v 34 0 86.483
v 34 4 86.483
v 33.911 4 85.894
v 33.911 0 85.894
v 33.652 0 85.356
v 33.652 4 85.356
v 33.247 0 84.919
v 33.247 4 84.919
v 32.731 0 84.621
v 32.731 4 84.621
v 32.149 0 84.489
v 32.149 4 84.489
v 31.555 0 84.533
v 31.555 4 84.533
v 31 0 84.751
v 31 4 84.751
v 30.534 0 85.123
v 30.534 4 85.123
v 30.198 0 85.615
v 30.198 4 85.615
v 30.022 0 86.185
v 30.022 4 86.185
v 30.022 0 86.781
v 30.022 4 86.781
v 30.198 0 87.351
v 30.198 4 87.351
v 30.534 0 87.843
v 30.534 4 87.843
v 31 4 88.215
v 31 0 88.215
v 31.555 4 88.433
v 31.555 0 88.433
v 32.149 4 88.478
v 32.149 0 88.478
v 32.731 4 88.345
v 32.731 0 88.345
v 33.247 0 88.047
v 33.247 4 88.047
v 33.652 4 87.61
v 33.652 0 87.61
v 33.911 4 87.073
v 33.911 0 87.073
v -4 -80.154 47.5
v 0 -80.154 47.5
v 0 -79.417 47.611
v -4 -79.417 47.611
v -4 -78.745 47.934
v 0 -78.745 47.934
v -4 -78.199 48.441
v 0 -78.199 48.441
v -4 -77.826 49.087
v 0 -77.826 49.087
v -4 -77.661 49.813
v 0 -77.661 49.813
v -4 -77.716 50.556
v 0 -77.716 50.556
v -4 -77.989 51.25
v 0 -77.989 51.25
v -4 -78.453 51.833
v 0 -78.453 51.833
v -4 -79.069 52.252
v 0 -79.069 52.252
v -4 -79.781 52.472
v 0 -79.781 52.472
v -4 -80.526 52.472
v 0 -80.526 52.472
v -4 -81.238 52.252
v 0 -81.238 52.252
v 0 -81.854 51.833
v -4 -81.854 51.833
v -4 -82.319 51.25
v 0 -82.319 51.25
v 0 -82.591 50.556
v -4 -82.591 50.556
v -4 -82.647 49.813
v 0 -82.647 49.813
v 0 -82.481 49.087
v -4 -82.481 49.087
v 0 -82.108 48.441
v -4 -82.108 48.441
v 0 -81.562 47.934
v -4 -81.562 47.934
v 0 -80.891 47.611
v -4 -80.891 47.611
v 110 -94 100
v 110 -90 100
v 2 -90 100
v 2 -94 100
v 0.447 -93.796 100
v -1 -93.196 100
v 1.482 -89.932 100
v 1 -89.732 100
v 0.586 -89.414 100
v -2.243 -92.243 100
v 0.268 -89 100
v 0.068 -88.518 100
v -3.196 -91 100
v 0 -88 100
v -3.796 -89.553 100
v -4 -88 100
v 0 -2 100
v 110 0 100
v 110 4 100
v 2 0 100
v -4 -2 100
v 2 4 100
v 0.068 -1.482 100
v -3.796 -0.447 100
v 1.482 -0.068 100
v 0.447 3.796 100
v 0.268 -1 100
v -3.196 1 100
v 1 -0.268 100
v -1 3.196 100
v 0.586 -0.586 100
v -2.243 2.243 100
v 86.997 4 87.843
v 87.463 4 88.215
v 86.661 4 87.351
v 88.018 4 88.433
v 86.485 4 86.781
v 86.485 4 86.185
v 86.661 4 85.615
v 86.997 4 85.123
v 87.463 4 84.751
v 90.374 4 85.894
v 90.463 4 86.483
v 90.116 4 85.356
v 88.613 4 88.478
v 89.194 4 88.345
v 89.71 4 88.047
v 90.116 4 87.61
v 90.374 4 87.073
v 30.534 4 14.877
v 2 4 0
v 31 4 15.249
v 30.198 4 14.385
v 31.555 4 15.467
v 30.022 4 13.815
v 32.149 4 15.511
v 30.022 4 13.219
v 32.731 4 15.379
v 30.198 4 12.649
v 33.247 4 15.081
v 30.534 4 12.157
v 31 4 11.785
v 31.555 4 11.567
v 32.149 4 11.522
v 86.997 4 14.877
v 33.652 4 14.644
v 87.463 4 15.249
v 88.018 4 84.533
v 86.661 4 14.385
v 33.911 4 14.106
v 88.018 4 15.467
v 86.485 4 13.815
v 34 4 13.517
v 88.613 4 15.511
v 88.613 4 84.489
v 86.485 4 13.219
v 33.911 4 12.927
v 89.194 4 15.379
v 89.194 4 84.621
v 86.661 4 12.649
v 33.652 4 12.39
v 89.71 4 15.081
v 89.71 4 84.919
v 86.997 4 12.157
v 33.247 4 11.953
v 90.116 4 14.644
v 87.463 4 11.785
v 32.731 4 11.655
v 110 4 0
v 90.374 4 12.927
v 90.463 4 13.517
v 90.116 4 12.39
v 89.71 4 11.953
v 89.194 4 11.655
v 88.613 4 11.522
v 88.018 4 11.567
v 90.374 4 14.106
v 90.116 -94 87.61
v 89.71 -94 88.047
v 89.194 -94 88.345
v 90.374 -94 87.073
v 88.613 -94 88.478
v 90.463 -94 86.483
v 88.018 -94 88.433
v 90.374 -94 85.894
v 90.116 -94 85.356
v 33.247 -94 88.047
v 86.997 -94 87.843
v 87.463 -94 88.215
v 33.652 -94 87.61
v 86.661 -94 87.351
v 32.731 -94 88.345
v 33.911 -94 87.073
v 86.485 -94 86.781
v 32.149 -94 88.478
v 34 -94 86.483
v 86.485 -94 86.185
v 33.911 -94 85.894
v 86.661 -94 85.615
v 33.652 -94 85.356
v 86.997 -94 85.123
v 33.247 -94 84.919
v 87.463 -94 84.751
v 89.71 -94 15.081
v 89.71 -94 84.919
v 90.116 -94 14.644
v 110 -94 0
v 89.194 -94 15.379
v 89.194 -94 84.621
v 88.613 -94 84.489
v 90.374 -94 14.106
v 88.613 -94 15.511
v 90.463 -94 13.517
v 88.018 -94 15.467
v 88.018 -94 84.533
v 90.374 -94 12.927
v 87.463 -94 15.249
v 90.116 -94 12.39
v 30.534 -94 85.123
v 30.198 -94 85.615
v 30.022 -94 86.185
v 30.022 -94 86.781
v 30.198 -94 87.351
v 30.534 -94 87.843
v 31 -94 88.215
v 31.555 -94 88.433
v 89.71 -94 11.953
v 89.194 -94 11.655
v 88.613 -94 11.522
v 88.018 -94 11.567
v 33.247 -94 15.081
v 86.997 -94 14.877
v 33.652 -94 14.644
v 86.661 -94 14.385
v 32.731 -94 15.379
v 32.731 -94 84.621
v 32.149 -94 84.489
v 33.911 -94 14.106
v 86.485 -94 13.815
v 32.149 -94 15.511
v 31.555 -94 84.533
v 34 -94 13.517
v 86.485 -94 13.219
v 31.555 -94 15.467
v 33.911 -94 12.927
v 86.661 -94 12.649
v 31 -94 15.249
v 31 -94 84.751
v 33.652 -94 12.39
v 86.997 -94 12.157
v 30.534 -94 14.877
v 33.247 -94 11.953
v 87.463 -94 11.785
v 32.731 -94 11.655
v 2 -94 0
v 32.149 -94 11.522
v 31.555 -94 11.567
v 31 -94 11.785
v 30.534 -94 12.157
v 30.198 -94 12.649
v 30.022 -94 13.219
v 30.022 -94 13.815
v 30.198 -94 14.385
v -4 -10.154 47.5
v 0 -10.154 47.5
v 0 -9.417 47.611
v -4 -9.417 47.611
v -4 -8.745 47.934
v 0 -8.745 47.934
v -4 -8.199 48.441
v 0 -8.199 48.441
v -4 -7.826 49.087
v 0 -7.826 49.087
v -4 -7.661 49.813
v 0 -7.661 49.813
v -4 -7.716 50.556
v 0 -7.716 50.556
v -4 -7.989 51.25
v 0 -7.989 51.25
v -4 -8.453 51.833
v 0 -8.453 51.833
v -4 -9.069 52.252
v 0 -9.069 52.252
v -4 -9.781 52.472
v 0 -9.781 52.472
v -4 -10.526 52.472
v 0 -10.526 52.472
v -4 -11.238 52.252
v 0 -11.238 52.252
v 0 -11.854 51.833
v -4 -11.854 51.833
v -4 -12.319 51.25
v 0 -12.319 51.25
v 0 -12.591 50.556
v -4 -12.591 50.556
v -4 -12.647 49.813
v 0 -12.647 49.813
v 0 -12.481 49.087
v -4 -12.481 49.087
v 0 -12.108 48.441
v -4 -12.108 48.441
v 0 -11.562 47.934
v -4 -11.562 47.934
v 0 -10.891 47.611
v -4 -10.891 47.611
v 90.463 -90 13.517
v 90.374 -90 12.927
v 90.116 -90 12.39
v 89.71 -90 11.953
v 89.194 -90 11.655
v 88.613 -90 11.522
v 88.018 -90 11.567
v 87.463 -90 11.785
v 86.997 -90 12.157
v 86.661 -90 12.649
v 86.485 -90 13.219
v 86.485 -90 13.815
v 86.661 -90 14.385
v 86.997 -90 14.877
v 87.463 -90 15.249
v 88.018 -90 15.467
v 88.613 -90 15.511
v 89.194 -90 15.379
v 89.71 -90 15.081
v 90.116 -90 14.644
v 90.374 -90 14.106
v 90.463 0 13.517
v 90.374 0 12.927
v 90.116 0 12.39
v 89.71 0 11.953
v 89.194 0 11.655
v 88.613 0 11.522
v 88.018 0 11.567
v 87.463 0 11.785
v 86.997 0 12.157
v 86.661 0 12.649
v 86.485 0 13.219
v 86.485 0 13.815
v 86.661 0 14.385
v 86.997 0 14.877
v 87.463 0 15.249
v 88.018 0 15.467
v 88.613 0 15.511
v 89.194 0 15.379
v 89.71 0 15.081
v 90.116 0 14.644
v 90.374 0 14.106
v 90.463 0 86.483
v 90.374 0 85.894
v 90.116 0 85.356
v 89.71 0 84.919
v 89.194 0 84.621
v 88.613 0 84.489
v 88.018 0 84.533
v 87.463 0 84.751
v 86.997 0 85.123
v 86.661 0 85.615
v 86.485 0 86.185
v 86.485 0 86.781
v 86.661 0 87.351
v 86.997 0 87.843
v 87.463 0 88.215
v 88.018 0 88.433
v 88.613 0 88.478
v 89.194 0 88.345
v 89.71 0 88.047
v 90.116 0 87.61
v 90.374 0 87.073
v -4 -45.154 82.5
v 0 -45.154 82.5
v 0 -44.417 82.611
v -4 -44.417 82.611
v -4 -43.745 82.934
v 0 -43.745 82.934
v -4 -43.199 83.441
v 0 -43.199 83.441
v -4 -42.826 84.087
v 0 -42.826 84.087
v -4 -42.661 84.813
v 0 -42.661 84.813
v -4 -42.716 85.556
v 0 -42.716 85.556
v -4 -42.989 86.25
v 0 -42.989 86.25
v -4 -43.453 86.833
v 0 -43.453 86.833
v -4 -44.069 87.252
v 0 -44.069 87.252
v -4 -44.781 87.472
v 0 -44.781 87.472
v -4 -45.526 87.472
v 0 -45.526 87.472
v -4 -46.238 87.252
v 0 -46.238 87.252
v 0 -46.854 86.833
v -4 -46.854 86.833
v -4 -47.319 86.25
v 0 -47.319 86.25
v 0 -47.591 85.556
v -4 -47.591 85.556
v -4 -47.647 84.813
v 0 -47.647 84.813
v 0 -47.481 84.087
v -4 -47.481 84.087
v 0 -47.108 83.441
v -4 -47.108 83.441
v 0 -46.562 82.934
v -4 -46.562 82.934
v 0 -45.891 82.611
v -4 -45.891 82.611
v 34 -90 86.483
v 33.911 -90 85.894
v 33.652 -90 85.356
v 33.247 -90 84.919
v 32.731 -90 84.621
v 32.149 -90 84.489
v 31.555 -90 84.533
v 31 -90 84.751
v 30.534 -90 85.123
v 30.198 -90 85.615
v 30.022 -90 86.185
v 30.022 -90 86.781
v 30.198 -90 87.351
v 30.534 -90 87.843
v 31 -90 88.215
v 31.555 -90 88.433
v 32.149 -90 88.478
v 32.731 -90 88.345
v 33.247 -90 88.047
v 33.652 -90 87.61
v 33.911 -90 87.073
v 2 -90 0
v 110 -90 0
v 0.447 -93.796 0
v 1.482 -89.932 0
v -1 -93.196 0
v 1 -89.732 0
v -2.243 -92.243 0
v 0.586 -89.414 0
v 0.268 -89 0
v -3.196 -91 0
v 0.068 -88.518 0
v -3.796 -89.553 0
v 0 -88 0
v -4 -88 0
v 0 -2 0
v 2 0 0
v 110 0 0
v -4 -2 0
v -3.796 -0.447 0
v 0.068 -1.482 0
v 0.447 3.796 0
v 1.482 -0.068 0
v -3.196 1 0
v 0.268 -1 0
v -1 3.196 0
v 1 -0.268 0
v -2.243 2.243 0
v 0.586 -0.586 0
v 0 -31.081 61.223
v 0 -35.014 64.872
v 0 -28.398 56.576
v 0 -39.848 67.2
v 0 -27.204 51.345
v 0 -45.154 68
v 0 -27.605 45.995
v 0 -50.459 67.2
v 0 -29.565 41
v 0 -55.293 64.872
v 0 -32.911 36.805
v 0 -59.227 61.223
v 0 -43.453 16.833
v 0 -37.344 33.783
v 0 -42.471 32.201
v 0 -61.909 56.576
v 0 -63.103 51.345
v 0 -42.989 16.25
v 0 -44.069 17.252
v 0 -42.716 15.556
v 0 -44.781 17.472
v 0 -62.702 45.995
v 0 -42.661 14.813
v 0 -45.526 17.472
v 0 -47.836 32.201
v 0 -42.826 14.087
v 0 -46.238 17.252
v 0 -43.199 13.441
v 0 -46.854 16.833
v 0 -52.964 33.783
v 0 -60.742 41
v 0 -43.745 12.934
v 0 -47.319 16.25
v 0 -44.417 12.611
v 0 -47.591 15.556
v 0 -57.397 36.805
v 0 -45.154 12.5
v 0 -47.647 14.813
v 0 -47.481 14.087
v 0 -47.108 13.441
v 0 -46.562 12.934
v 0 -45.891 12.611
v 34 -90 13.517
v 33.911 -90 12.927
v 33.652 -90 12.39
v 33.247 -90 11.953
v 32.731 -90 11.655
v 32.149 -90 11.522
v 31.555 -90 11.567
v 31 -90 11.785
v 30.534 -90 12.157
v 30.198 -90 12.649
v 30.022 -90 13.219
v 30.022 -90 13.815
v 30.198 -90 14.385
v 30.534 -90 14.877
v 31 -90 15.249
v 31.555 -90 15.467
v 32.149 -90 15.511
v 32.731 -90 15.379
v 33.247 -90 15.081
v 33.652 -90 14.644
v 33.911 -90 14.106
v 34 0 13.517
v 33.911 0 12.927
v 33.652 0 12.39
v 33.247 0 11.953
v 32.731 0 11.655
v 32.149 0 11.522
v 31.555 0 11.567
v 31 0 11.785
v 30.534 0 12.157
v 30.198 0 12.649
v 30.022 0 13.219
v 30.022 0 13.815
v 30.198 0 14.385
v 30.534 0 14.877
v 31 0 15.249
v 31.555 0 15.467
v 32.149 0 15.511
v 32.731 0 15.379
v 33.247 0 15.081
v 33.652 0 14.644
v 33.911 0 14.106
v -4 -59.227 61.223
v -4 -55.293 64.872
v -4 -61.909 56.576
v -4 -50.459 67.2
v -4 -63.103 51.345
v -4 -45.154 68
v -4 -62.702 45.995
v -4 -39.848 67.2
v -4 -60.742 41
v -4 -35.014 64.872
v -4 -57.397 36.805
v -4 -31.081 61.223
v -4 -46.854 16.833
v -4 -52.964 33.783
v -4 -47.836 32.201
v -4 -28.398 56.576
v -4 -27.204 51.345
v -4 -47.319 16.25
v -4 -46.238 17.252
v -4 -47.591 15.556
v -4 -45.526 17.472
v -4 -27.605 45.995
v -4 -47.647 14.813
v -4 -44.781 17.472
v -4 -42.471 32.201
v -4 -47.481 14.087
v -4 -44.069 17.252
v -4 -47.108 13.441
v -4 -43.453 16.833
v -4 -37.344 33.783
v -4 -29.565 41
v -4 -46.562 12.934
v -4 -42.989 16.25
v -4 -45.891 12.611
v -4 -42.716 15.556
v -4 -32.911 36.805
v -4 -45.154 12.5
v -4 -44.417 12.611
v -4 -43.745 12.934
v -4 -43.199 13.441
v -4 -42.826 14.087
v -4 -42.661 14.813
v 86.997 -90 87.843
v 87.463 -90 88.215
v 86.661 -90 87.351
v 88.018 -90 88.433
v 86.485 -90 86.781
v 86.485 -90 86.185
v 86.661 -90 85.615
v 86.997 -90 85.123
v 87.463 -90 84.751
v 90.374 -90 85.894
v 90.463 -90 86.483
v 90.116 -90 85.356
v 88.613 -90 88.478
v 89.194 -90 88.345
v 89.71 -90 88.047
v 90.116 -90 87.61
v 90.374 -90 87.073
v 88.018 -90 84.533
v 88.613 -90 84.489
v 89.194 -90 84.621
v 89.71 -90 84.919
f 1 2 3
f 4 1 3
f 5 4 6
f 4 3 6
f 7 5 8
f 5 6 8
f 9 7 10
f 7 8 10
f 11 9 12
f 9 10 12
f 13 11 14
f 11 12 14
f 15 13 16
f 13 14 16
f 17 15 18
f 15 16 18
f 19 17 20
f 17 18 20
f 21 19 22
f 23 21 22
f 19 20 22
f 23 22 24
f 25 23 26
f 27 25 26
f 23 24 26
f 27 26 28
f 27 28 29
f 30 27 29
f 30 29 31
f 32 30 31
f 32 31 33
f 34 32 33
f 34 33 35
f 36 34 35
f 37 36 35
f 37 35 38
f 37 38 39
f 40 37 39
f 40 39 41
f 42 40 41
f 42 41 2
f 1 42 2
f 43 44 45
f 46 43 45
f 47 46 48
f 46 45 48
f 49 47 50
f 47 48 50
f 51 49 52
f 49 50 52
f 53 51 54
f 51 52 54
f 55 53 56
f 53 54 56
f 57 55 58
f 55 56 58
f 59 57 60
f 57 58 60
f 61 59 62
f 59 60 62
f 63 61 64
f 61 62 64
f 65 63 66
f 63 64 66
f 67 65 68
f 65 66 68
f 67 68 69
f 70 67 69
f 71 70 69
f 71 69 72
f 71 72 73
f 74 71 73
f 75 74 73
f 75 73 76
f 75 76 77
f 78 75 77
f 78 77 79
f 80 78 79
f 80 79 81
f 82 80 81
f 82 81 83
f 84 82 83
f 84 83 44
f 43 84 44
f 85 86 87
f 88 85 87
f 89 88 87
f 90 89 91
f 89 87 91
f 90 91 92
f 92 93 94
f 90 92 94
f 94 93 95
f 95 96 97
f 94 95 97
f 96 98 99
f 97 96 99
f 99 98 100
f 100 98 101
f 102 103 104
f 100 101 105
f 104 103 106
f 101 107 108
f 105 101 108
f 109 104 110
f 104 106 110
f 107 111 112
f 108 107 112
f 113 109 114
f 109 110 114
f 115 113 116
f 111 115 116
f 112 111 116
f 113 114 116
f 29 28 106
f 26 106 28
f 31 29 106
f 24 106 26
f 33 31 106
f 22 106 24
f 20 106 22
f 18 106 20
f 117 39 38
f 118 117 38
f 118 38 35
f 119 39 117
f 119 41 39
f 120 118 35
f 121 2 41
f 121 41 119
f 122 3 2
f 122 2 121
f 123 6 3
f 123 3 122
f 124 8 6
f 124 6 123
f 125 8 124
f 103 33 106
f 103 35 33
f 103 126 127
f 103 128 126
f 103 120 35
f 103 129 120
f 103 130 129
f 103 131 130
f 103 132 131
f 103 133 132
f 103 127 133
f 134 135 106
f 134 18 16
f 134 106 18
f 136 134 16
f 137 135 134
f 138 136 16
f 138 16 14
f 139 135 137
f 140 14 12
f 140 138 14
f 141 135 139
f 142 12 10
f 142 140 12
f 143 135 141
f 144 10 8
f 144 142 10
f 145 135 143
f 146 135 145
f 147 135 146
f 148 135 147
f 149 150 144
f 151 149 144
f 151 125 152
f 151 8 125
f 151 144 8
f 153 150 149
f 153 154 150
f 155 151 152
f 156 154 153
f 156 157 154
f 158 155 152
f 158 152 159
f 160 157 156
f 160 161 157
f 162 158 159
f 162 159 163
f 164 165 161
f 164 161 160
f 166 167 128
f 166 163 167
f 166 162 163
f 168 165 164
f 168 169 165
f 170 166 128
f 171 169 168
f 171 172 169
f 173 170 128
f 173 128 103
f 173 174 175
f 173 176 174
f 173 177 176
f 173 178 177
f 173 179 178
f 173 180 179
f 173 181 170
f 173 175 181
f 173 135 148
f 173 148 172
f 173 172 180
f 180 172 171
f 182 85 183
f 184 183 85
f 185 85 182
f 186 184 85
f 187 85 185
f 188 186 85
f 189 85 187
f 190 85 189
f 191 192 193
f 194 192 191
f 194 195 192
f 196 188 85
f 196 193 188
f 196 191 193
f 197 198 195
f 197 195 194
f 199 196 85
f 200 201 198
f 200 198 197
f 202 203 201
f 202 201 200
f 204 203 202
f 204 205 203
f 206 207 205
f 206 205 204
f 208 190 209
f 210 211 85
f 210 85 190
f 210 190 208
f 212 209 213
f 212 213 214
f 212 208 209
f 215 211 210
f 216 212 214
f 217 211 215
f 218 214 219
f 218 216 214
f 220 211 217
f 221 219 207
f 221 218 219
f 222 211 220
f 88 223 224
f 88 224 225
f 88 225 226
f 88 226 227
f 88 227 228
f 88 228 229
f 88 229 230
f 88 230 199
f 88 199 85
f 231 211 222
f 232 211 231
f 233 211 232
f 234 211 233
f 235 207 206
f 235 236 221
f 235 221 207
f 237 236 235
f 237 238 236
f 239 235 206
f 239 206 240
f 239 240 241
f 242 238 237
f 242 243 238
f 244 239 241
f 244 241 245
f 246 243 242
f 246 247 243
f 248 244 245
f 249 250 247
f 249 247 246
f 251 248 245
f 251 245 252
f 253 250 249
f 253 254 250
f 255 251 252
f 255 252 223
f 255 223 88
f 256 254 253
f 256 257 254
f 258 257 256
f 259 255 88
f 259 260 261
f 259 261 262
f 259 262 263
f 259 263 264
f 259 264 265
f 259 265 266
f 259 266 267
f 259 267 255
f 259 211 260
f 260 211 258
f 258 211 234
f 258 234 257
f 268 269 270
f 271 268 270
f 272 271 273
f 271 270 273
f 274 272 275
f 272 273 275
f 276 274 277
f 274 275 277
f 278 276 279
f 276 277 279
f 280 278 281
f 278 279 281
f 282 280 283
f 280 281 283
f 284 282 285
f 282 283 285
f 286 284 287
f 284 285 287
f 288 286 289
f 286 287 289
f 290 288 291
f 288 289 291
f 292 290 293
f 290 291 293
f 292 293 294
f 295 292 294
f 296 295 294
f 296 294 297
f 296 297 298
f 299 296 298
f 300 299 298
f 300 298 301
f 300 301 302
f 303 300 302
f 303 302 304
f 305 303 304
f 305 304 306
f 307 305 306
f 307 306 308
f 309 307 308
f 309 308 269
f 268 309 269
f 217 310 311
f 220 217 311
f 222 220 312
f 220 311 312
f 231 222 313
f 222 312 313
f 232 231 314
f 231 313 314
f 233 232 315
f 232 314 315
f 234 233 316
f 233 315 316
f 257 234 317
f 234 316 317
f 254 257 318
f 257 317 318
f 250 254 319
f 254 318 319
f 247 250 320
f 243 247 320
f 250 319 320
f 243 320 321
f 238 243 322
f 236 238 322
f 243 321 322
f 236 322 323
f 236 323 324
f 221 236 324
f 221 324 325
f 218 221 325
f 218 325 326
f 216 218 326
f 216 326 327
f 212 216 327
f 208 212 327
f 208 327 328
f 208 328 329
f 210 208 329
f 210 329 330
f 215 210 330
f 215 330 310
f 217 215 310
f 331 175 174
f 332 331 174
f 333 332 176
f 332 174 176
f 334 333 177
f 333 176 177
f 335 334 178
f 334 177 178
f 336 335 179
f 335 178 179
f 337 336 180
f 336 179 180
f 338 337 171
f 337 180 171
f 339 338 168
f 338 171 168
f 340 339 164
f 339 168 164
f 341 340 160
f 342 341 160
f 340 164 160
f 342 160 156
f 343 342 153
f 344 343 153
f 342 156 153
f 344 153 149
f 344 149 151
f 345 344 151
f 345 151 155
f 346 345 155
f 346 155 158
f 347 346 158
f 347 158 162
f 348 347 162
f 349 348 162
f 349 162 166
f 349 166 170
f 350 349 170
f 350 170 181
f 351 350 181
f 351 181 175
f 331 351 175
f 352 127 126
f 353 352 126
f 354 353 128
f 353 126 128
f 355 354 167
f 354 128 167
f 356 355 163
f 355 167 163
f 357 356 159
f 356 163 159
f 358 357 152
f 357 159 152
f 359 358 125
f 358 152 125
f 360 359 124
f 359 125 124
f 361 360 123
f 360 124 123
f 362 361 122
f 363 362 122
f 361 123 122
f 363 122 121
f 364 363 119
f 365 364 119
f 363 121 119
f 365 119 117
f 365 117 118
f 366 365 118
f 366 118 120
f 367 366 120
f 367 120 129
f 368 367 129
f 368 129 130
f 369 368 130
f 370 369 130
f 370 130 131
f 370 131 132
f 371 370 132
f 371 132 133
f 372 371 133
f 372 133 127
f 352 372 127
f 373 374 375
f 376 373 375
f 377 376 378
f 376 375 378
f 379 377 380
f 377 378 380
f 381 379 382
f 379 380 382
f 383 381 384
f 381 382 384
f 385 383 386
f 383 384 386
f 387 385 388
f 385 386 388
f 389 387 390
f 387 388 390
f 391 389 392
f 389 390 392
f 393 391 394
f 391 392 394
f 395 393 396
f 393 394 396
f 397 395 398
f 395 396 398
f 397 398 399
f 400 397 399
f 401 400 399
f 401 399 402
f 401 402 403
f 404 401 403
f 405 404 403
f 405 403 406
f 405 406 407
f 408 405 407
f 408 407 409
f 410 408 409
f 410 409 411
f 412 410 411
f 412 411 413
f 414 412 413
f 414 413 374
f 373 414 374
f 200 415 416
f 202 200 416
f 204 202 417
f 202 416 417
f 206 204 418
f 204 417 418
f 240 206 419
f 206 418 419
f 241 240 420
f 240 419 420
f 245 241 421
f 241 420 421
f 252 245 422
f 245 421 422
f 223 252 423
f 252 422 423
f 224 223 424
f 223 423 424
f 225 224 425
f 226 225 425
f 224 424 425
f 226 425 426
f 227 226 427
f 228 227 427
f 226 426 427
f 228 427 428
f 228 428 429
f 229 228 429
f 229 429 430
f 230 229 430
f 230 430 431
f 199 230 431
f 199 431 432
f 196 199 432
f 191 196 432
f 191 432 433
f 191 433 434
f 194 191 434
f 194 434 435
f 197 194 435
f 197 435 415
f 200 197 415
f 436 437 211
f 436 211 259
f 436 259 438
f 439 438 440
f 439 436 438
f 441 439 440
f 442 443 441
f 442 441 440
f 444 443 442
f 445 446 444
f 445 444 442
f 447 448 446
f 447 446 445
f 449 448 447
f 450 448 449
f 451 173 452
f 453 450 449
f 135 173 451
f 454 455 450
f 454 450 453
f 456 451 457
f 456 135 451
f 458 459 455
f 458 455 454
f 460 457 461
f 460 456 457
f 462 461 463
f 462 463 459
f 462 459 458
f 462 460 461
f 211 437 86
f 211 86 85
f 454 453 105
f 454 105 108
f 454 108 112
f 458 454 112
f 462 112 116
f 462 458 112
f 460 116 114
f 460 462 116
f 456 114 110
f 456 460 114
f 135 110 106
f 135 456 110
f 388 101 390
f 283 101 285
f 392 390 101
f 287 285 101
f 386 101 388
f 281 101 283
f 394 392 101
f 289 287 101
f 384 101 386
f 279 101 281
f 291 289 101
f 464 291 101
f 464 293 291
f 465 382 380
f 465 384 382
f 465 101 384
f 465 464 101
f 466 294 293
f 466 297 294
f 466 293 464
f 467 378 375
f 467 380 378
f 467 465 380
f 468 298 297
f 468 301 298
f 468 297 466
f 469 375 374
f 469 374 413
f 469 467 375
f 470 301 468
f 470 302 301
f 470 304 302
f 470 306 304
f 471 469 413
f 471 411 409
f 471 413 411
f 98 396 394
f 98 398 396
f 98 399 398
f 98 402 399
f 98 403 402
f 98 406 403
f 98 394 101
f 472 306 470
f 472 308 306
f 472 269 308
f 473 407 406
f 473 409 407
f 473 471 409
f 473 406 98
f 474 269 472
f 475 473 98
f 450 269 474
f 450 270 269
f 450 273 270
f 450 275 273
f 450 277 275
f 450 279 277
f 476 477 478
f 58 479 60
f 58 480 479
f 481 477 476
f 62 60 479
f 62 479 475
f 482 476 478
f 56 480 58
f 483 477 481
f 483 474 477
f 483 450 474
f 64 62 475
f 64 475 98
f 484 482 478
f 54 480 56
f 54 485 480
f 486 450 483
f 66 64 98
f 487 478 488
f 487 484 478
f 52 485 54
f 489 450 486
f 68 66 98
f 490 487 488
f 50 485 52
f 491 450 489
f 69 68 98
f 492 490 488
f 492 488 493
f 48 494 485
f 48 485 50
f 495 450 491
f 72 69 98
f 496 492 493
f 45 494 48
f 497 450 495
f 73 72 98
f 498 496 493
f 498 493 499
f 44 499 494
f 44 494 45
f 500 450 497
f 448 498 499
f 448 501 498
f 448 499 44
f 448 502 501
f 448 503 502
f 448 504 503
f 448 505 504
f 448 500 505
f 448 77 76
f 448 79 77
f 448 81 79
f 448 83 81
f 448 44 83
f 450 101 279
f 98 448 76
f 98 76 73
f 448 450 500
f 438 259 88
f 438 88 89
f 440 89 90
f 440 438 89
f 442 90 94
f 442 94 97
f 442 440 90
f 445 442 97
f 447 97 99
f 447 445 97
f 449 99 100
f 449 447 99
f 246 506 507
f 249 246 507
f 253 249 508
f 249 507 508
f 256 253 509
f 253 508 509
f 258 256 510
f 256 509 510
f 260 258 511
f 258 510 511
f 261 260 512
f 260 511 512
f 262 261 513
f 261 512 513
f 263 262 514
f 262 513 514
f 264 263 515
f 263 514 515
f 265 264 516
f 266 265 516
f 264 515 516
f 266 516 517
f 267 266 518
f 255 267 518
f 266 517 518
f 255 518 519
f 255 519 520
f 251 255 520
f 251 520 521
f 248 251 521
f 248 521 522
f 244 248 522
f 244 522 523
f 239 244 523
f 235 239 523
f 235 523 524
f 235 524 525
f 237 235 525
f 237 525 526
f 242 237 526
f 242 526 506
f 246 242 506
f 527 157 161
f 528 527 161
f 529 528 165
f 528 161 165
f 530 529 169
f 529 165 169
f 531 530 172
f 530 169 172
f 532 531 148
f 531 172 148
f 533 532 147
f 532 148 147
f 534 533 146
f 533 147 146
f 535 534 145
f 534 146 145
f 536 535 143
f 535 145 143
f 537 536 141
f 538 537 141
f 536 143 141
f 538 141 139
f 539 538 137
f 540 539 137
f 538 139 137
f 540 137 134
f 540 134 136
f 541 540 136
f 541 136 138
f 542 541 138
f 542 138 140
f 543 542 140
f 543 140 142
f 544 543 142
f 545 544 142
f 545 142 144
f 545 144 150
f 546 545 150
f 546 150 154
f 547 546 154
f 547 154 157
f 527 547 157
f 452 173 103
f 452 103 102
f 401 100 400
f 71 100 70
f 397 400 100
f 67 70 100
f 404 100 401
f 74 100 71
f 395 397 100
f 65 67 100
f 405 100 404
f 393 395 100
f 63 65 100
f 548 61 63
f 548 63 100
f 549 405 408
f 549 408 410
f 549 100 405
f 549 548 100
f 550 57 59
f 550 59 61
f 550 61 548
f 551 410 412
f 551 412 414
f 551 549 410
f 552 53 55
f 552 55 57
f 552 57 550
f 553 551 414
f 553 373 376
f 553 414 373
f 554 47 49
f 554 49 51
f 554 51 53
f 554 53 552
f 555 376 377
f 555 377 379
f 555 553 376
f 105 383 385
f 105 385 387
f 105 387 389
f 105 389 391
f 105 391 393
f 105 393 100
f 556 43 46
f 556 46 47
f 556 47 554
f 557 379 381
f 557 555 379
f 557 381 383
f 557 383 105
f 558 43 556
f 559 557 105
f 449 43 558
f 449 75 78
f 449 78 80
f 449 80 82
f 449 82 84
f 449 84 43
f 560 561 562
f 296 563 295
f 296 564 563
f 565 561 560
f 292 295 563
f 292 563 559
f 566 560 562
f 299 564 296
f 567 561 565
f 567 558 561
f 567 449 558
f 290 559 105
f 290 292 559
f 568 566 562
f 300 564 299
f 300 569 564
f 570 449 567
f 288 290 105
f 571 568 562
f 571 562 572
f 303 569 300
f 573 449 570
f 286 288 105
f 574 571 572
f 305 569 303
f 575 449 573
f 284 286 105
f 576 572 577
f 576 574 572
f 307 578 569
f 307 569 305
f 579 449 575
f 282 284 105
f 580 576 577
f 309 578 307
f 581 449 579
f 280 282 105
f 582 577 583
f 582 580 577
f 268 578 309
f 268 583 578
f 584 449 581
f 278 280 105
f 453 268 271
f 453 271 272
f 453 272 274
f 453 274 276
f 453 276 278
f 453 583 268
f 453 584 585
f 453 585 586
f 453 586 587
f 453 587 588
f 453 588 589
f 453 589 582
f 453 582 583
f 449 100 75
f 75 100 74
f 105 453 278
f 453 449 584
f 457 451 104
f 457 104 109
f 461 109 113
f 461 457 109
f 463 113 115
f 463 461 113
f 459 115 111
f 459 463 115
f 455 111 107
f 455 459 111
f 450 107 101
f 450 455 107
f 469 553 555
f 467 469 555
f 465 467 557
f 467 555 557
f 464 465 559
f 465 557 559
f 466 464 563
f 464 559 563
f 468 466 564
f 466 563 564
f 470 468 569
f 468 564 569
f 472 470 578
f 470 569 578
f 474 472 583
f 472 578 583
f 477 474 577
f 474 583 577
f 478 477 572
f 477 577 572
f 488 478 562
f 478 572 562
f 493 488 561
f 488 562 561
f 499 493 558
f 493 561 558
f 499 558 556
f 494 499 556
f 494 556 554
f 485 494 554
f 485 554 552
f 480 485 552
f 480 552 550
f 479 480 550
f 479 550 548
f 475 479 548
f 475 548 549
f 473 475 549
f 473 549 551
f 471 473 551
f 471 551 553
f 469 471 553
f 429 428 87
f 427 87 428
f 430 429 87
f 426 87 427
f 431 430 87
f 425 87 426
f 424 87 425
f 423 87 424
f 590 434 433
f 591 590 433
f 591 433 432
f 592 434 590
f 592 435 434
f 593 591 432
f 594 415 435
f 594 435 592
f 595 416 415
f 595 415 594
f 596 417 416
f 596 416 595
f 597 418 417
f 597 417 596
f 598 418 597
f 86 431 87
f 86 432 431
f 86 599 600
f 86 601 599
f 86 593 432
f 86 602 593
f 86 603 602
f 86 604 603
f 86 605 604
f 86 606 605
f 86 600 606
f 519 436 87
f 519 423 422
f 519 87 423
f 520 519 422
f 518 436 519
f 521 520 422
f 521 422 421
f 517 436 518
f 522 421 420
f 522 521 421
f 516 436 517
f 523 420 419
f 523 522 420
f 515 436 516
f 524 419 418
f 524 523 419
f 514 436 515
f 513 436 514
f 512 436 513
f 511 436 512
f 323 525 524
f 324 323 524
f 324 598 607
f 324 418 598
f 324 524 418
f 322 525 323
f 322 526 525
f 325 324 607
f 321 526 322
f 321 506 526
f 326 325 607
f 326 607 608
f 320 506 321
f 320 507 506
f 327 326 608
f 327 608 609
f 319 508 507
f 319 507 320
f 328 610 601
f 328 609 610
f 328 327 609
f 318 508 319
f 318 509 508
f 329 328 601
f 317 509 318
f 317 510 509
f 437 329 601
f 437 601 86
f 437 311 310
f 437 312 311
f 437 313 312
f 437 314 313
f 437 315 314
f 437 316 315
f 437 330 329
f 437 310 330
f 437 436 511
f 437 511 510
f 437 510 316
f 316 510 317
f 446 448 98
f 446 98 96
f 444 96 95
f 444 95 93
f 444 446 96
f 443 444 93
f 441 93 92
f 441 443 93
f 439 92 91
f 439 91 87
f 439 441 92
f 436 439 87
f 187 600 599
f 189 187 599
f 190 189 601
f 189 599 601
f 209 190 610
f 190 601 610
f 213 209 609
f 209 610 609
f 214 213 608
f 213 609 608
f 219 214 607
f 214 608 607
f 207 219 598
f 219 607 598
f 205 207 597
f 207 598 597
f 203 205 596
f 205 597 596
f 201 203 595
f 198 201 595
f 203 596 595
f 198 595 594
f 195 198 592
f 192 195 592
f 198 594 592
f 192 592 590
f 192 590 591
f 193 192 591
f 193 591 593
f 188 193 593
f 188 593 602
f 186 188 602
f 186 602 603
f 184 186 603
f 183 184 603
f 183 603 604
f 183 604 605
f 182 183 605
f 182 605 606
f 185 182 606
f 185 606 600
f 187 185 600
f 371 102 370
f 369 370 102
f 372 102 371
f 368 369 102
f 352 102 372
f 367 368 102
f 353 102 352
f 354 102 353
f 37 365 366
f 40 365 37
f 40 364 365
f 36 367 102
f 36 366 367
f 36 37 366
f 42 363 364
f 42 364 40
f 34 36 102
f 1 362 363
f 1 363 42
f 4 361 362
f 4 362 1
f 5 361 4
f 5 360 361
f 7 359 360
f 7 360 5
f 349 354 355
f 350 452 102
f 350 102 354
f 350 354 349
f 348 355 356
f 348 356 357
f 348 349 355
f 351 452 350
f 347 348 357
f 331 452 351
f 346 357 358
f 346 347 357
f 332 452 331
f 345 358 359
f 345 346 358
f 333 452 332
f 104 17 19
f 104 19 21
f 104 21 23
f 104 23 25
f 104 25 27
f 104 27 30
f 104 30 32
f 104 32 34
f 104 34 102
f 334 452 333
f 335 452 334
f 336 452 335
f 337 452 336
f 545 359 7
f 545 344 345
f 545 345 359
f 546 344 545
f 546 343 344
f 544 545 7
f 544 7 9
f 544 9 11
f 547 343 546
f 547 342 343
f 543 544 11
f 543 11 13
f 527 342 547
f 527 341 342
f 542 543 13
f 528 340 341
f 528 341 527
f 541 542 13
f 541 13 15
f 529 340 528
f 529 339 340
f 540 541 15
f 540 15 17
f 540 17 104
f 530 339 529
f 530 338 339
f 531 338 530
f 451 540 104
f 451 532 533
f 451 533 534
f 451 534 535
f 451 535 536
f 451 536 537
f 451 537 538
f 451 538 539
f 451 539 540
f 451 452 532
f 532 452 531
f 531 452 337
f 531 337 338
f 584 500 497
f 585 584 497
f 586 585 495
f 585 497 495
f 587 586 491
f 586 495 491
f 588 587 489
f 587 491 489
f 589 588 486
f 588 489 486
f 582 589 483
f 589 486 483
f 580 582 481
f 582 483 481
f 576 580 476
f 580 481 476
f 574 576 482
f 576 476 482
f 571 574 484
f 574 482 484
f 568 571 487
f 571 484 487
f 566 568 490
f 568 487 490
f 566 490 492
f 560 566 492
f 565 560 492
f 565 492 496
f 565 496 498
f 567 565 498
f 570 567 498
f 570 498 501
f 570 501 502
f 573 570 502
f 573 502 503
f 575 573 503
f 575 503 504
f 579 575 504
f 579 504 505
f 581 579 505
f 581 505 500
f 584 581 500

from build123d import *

# Parameters (mm, degrees)
BASE_FLANGE3_DEPTH        = 100
SKETCH16_R                = 18
CUT_EXTRUDE1_DEPTH        = 10
F_4_0MM_DOWEL_HOLE1_D     = 4
F_5_0MM_DOWEL_HOLE1_D     = 5
F_5_0MM_DOWEL_HOLE1_DEPTH = 98.31
F_5_0MM_DOWEL_HOLE1_TIP   = 1.502151548


# Sheet-metal steps are written as plain solids
with BuildPart() as part:
    # Sketch1 → Base-Flange3 (new body)
    with BuildSketch(Plane.XY):
        with BuildLine():
            Line((110, 0), (2, 0))
            ThreePointArc((2, 0), (0.585786438, -0.585786438), (0, -2))
            Line((0, -2), (0, -88))
            ThreePointArc((0, -88), (0.585786438, -89.414213562), (2, -90))
            Line((2, -90), (110, -90))
            Line((110, -90), (110, -94))
            Line((110, -94), (2, -94))
            ThreePointArc((2, -94), (-2.242640687, -92.242640687), (-4, -88))
            Line((-4, -88), (-4, -2))
            ThreePointArc((-4, -2), (-2.242640687, 2.242640687), (2, 4))
            Line((2, 4), (110, 4))
            Line((110, 4), (110, 0))
        make_face()
    extrude(amount=BASE_FLANGE3_DEPTH)

    # Sketch16 → Cut-Extrude1 (cut)
    with BuildSketch(Plane.ZY.offset(4)):
        with Locations((50, -45.153641777)):
            Circle(SKETCH16_R)
    extrude(amount=-CUT_EXTRUDE1_DEPTH, mode=Mode.SUBTRACT)

    # Ø4.0mm Dowel Hole1 (through all)
    with Locations(Plane(origin=(0, -94, 0), x_dir=(-1, 0, 0), z_dir=(0, -1, 0))):
        with Locations((-32, -86.483109463), (-32, -13.516890537), (-88.463106056, -86.483109463), (-88.463106056, -13.516890537)):
            Hole(F_4_0MM_DOWEL_HOLE1_D / 2)

    # Ø5.0mm Dowel Hole1
    with Locations(Plane.ZY.offset(4)):
        with Locations((50, -10.153641777), (85, -45.153641777), (50, -80.153641777), (15, -45.153641777)):
            Hole(F_5_0MM_DOWEL_HOLE1_D / 2, depth=F_5_0MM_DOWEL_HOLE1_DEPTH)
            with Locations((0, 0, -(F_5_0MM_DOWEL_HOLE1_DEPTH + F_5_0MM_DOWEL_HOLE1_TIP / 2))):  # 118° drill point
                Cone(0, F_5_0MM_DOWEL_HOLE1_D / 2, F_5_0MM_DOWEL_HOLE1_TIP, mode=Mode.SUBTRACT)


solid = part.part
